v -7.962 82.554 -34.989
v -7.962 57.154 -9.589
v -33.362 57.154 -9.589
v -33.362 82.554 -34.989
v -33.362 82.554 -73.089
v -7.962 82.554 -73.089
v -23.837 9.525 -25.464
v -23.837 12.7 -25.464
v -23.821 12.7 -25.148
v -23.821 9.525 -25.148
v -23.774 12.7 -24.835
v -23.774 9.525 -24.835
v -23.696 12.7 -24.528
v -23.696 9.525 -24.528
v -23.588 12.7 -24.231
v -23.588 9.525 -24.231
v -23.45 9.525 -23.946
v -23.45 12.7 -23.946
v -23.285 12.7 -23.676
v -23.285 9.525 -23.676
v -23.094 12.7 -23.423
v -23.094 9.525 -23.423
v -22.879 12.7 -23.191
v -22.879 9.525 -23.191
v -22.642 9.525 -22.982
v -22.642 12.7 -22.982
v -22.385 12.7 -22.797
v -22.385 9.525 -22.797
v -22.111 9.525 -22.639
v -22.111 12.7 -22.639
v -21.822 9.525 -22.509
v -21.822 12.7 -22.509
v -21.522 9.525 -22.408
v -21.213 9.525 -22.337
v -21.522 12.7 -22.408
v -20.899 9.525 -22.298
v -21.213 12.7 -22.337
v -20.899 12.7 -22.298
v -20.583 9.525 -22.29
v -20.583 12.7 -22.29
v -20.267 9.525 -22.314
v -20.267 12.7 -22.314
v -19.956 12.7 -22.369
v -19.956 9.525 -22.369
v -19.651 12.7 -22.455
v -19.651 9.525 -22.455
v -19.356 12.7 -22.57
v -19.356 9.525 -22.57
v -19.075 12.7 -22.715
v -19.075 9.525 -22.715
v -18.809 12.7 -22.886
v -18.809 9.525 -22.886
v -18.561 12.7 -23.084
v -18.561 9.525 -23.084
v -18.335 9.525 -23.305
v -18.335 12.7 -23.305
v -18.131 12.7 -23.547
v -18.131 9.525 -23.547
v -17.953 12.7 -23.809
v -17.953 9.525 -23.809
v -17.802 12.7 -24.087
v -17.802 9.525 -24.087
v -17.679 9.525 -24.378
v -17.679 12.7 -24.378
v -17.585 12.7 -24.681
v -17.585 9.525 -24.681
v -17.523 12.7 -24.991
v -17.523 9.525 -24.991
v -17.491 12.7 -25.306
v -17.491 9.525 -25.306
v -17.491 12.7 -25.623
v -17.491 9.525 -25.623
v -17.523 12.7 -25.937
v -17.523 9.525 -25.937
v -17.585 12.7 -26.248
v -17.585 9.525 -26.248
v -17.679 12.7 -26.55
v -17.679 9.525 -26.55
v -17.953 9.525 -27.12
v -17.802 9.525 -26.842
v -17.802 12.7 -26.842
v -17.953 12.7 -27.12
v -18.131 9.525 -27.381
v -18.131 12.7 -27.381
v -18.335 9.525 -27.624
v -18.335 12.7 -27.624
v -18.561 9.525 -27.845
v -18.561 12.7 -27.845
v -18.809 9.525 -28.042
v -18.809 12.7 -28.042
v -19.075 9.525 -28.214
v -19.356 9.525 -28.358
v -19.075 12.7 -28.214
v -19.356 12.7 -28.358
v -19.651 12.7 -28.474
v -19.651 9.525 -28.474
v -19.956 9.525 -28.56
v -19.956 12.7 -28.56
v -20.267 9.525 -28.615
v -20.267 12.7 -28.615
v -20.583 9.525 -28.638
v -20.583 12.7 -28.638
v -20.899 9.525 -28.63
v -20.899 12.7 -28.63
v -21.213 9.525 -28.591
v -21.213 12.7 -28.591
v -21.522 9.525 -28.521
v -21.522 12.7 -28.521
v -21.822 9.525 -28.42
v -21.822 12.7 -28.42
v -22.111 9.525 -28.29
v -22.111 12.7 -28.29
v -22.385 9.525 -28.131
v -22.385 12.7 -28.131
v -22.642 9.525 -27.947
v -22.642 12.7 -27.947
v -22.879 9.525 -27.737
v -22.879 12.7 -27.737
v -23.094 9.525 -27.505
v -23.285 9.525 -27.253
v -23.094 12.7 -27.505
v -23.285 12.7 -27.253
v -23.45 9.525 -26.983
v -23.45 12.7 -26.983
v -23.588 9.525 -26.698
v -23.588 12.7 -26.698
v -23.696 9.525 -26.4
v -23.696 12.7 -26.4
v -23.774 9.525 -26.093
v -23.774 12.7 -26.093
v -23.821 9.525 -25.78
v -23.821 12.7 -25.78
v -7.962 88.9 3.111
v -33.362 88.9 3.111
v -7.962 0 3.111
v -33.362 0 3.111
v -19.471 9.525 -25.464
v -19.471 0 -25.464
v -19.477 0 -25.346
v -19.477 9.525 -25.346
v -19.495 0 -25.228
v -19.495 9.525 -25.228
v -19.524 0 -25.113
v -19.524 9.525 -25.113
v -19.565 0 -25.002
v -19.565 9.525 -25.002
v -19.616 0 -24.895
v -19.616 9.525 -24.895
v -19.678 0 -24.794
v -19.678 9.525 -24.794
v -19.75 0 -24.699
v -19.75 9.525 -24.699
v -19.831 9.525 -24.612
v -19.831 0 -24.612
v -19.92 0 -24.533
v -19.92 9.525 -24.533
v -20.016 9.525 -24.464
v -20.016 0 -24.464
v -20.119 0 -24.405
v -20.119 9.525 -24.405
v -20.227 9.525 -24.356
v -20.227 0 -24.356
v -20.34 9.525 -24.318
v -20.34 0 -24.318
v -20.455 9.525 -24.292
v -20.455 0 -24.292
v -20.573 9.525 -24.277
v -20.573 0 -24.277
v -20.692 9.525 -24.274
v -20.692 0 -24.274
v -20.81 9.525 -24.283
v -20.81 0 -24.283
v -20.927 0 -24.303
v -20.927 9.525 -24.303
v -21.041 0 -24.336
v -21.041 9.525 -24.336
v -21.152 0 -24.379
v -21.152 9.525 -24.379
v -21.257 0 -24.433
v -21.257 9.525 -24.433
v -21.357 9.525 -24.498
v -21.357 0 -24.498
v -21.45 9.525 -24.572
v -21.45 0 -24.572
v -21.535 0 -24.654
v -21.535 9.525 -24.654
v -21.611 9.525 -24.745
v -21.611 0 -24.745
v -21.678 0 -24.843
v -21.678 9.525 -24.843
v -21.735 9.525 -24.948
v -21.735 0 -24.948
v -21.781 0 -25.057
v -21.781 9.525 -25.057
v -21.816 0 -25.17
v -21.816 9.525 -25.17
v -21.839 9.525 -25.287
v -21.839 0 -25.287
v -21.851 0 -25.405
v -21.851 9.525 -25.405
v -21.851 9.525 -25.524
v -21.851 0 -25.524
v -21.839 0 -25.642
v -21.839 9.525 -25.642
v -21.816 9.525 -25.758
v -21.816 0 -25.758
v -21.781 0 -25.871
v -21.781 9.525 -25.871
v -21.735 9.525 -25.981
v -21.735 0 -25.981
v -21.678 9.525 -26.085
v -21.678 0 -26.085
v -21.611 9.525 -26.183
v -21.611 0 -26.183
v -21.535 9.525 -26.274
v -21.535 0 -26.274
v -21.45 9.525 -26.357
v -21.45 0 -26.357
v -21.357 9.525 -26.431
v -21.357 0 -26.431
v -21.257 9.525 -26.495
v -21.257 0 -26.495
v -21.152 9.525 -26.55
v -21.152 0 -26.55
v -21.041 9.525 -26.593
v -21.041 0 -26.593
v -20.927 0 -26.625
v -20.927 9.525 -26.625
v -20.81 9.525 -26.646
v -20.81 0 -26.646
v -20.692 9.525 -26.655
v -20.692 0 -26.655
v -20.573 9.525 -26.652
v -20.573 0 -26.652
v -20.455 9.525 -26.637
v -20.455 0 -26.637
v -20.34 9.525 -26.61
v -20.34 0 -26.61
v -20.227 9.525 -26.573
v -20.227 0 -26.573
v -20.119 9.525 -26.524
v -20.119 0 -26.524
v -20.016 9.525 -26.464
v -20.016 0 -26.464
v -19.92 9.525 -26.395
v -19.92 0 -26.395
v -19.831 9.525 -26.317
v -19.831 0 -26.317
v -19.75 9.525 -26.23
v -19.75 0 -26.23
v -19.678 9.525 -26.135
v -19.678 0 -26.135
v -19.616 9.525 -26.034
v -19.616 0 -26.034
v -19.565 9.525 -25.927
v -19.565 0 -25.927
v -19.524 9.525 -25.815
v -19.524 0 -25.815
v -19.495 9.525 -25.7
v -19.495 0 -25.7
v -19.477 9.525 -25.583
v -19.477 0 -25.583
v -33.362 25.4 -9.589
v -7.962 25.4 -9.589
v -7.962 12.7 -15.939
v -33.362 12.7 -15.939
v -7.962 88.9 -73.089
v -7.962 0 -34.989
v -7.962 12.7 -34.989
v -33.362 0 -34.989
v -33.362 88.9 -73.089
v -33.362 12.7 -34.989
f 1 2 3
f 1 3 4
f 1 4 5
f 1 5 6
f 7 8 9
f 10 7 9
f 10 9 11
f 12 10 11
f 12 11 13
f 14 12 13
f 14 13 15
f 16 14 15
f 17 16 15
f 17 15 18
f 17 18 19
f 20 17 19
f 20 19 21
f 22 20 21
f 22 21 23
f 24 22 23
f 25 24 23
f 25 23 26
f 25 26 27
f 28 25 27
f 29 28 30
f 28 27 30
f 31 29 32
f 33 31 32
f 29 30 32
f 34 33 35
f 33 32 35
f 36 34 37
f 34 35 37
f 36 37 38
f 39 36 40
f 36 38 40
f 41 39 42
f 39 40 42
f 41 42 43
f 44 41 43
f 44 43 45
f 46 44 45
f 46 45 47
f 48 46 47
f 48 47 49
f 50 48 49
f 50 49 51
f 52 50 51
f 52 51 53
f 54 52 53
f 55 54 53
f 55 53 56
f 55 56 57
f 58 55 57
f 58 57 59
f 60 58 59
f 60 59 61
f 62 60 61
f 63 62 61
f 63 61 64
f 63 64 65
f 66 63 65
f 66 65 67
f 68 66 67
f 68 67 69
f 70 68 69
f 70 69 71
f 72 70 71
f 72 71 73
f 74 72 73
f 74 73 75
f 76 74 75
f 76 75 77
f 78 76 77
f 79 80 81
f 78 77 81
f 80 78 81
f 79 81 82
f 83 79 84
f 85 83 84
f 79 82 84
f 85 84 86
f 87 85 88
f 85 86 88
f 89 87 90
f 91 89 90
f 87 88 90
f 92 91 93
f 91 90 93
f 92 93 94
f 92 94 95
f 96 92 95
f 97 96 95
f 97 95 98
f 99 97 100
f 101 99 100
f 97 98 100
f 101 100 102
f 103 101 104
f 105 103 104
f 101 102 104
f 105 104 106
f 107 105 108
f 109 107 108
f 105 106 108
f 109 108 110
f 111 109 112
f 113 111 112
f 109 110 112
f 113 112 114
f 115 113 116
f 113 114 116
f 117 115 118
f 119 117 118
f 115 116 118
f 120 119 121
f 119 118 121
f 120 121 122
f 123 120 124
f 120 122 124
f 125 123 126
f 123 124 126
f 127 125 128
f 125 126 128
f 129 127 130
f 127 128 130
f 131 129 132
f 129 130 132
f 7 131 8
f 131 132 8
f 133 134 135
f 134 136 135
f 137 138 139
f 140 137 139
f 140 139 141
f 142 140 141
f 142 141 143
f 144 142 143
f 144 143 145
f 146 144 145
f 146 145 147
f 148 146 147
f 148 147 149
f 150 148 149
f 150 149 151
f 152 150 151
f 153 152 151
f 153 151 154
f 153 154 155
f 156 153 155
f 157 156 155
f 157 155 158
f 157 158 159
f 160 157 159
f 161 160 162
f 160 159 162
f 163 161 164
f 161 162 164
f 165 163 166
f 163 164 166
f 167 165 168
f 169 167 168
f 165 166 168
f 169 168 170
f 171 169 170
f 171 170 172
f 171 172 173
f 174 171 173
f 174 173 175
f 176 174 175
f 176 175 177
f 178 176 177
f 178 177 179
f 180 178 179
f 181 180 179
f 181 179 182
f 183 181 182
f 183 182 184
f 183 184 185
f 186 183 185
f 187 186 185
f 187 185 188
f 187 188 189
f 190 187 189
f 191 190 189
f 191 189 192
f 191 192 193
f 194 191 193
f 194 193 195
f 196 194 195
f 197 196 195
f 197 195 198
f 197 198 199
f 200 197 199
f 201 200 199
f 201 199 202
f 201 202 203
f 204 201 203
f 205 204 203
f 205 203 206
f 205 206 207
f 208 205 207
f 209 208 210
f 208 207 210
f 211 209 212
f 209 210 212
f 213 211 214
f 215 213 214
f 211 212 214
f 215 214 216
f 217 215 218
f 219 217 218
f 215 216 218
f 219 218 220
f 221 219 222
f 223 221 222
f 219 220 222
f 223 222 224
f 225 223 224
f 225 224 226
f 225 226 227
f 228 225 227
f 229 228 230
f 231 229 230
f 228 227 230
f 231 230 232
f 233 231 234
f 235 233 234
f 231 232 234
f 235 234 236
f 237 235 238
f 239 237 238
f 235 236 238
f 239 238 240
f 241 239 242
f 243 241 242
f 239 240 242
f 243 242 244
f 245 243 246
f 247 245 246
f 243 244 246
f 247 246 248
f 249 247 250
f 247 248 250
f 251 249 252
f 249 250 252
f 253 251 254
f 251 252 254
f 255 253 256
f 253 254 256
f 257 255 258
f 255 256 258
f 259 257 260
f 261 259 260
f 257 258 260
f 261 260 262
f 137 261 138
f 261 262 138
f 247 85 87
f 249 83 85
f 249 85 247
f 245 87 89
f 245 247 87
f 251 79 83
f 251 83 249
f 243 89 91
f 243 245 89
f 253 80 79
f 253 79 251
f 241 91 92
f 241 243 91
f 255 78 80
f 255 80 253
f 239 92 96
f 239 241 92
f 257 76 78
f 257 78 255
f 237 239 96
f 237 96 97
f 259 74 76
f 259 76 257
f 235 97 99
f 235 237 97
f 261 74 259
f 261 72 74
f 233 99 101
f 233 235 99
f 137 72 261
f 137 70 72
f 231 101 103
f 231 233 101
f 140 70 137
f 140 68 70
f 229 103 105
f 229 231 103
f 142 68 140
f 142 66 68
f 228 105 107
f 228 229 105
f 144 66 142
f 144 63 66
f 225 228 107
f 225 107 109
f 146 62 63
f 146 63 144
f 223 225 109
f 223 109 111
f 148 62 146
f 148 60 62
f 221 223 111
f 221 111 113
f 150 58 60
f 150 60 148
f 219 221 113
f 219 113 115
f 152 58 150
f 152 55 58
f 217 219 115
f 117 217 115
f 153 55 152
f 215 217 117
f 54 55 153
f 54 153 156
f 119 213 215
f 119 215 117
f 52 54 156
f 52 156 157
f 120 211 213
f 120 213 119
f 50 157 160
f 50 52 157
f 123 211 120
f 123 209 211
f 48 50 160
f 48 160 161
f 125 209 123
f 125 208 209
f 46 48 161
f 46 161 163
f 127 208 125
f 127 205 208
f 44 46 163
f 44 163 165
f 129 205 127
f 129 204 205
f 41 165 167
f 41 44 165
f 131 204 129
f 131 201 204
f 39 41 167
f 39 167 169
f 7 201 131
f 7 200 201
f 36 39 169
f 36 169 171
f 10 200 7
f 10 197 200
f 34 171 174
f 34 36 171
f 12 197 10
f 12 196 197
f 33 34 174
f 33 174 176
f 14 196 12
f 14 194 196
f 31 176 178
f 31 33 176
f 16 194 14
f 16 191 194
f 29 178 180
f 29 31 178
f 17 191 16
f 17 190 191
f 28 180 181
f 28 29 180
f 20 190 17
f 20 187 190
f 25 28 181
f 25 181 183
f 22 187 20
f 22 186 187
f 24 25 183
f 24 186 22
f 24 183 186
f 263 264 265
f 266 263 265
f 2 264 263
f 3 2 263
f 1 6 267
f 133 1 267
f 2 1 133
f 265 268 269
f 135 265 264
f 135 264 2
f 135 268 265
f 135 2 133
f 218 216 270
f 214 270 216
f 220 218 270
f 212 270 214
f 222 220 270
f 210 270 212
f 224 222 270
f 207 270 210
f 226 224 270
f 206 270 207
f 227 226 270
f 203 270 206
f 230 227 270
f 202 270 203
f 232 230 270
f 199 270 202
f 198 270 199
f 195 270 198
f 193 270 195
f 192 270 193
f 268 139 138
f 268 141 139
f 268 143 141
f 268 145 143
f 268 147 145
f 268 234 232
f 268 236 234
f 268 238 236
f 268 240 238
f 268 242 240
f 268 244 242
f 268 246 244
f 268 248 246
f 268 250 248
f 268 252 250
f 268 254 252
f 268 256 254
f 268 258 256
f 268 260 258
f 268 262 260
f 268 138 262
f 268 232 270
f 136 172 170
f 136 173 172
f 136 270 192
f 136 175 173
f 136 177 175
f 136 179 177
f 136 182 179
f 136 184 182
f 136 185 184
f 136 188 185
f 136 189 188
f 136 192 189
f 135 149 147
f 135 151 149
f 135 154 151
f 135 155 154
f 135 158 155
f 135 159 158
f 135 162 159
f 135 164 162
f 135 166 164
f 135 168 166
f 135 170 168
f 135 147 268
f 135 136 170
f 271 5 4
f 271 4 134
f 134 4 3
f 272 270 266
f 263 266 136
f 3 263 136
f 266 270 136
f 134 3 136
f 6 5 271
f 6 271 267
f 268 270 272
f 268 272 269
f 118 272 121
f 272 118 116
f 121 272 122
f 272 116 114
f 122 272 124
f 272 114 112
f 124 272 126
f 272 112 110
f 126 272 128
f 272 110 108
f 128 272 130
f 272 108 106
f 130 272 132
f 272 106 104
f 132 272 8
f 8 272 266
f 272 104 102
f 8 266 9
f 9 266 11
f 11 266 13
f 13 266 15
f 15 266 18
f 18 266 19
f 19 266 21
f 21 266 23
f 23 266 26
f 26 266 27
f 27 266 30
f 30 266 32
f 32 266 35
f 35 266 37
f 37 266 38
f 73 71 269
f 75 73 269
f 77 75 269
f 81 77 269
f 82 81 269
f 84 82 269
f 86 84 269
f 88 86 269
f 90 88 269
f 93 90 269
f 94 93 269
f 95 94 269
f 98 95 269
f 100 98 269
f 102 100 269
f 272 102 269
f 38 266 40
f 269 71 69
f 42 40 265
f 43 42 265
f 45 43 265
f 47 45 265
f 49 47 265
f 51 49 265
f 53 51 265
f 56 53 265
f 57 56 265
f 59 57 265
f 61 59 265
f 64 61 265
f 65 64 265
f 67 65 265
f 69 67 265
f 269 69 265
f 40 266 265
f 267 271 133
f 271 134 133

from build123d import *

# Parameters (mm, degrees)
F0_W            = 25.4
F0_H            = 38.1
F1_DEPTH        = 12.7
F3_DEPTH        = 76.2
F4_W            = 25.4
F4_H            = 6.346226
F5_DEPTH        = 63.5
F7_DEPTH        = 25.4
F8_W            = 25.4
F8_H            = 6.35
F9_DEPTH        = 12.7
F11_DEPTH       = 25.4
F13_D           = 2.38125
F13_DEPTH       = 12.7
F13_CBORE_D     = 6.35
F13_CBORE_DEPTH = 3.175


with BuildPart() as f1:
    # F0 (on Front) → F1 (new body)
    with BuildSketch(Plane.XZ):
        with Locations((-20.66209, -15.939255)):
            Rectangle(F0_W, F0_H)
    extrude(amount=-F1_DEPTH)

    # F2 (on face) → F3 (join)
    with BuildSketch(Plane(origin=(0, 12.7, 0), x_dir=(-1, 0, 0), z_dir=(0, 1, 0))):
        Polygon((7.96209, -9.589255), (20.66209, -9.589255), (33.36209, -9.589255), (33.36209, 3.110745), (7.96209, 3.110745), align=None)
    extrude(amount=F3_DEPTH)

    # F4 (on face) → F5 (join)
    with BuildSketch(Plane(origin=(0, 0, -9.589255), x_dir=(1, 0, 0), z_dir=(0, 0, -1))):
        with Locations((-20.66209, -85.726887)):
            Rectangle(F4_W, F4_H)
    extrude(amount=F5_DEPTH)

    # F6 (on face) → F7 (join)
    with BuildSketch(Plane.YZ.offset(-7.96209)):
        Polygon((57.153774, -9.589255), (82.553774, -34.989255), (82.553774, -9.589255), align=None)
    extrude(amount=-F7_DEPTH)

    # F8 (on face) → F9 (join)
    with BuildSketch(Plane(origin=(0, 12.7, 0), x_dir=(-1, 0, 0), z_dir=(0, 1, 0))):
        with Locations((20.66209, -12.764255)):
            Rectangle(F8_W, F8_H)
    extrude(amount=F9_DEPTH)

    # F10 (on face) → F11 (cut, through all)
    with BuildSketch(Plane.YZ.offset(-7.96209)):
        Polygon((25.4, -15.939255), (25.4, -9.589255), (12.7, -15.939255), align=None)
    extrude(amount=-F11_DEPTH, mode=Mode.SUBTRACT)

    # F13
    with Locations(Plane(origin=(0, 12.7, 0), x_dir=(-1, 0, 0), z_dir=(0, 1, 0))):
        with Locations((20.66209, -25.464255)):
            CounterBoreHole(F13_D / 2, F13_CBORE_D / 2, F13_CBORE_DEPTH, depth=F13_DEPTH)


solid = f1.part
